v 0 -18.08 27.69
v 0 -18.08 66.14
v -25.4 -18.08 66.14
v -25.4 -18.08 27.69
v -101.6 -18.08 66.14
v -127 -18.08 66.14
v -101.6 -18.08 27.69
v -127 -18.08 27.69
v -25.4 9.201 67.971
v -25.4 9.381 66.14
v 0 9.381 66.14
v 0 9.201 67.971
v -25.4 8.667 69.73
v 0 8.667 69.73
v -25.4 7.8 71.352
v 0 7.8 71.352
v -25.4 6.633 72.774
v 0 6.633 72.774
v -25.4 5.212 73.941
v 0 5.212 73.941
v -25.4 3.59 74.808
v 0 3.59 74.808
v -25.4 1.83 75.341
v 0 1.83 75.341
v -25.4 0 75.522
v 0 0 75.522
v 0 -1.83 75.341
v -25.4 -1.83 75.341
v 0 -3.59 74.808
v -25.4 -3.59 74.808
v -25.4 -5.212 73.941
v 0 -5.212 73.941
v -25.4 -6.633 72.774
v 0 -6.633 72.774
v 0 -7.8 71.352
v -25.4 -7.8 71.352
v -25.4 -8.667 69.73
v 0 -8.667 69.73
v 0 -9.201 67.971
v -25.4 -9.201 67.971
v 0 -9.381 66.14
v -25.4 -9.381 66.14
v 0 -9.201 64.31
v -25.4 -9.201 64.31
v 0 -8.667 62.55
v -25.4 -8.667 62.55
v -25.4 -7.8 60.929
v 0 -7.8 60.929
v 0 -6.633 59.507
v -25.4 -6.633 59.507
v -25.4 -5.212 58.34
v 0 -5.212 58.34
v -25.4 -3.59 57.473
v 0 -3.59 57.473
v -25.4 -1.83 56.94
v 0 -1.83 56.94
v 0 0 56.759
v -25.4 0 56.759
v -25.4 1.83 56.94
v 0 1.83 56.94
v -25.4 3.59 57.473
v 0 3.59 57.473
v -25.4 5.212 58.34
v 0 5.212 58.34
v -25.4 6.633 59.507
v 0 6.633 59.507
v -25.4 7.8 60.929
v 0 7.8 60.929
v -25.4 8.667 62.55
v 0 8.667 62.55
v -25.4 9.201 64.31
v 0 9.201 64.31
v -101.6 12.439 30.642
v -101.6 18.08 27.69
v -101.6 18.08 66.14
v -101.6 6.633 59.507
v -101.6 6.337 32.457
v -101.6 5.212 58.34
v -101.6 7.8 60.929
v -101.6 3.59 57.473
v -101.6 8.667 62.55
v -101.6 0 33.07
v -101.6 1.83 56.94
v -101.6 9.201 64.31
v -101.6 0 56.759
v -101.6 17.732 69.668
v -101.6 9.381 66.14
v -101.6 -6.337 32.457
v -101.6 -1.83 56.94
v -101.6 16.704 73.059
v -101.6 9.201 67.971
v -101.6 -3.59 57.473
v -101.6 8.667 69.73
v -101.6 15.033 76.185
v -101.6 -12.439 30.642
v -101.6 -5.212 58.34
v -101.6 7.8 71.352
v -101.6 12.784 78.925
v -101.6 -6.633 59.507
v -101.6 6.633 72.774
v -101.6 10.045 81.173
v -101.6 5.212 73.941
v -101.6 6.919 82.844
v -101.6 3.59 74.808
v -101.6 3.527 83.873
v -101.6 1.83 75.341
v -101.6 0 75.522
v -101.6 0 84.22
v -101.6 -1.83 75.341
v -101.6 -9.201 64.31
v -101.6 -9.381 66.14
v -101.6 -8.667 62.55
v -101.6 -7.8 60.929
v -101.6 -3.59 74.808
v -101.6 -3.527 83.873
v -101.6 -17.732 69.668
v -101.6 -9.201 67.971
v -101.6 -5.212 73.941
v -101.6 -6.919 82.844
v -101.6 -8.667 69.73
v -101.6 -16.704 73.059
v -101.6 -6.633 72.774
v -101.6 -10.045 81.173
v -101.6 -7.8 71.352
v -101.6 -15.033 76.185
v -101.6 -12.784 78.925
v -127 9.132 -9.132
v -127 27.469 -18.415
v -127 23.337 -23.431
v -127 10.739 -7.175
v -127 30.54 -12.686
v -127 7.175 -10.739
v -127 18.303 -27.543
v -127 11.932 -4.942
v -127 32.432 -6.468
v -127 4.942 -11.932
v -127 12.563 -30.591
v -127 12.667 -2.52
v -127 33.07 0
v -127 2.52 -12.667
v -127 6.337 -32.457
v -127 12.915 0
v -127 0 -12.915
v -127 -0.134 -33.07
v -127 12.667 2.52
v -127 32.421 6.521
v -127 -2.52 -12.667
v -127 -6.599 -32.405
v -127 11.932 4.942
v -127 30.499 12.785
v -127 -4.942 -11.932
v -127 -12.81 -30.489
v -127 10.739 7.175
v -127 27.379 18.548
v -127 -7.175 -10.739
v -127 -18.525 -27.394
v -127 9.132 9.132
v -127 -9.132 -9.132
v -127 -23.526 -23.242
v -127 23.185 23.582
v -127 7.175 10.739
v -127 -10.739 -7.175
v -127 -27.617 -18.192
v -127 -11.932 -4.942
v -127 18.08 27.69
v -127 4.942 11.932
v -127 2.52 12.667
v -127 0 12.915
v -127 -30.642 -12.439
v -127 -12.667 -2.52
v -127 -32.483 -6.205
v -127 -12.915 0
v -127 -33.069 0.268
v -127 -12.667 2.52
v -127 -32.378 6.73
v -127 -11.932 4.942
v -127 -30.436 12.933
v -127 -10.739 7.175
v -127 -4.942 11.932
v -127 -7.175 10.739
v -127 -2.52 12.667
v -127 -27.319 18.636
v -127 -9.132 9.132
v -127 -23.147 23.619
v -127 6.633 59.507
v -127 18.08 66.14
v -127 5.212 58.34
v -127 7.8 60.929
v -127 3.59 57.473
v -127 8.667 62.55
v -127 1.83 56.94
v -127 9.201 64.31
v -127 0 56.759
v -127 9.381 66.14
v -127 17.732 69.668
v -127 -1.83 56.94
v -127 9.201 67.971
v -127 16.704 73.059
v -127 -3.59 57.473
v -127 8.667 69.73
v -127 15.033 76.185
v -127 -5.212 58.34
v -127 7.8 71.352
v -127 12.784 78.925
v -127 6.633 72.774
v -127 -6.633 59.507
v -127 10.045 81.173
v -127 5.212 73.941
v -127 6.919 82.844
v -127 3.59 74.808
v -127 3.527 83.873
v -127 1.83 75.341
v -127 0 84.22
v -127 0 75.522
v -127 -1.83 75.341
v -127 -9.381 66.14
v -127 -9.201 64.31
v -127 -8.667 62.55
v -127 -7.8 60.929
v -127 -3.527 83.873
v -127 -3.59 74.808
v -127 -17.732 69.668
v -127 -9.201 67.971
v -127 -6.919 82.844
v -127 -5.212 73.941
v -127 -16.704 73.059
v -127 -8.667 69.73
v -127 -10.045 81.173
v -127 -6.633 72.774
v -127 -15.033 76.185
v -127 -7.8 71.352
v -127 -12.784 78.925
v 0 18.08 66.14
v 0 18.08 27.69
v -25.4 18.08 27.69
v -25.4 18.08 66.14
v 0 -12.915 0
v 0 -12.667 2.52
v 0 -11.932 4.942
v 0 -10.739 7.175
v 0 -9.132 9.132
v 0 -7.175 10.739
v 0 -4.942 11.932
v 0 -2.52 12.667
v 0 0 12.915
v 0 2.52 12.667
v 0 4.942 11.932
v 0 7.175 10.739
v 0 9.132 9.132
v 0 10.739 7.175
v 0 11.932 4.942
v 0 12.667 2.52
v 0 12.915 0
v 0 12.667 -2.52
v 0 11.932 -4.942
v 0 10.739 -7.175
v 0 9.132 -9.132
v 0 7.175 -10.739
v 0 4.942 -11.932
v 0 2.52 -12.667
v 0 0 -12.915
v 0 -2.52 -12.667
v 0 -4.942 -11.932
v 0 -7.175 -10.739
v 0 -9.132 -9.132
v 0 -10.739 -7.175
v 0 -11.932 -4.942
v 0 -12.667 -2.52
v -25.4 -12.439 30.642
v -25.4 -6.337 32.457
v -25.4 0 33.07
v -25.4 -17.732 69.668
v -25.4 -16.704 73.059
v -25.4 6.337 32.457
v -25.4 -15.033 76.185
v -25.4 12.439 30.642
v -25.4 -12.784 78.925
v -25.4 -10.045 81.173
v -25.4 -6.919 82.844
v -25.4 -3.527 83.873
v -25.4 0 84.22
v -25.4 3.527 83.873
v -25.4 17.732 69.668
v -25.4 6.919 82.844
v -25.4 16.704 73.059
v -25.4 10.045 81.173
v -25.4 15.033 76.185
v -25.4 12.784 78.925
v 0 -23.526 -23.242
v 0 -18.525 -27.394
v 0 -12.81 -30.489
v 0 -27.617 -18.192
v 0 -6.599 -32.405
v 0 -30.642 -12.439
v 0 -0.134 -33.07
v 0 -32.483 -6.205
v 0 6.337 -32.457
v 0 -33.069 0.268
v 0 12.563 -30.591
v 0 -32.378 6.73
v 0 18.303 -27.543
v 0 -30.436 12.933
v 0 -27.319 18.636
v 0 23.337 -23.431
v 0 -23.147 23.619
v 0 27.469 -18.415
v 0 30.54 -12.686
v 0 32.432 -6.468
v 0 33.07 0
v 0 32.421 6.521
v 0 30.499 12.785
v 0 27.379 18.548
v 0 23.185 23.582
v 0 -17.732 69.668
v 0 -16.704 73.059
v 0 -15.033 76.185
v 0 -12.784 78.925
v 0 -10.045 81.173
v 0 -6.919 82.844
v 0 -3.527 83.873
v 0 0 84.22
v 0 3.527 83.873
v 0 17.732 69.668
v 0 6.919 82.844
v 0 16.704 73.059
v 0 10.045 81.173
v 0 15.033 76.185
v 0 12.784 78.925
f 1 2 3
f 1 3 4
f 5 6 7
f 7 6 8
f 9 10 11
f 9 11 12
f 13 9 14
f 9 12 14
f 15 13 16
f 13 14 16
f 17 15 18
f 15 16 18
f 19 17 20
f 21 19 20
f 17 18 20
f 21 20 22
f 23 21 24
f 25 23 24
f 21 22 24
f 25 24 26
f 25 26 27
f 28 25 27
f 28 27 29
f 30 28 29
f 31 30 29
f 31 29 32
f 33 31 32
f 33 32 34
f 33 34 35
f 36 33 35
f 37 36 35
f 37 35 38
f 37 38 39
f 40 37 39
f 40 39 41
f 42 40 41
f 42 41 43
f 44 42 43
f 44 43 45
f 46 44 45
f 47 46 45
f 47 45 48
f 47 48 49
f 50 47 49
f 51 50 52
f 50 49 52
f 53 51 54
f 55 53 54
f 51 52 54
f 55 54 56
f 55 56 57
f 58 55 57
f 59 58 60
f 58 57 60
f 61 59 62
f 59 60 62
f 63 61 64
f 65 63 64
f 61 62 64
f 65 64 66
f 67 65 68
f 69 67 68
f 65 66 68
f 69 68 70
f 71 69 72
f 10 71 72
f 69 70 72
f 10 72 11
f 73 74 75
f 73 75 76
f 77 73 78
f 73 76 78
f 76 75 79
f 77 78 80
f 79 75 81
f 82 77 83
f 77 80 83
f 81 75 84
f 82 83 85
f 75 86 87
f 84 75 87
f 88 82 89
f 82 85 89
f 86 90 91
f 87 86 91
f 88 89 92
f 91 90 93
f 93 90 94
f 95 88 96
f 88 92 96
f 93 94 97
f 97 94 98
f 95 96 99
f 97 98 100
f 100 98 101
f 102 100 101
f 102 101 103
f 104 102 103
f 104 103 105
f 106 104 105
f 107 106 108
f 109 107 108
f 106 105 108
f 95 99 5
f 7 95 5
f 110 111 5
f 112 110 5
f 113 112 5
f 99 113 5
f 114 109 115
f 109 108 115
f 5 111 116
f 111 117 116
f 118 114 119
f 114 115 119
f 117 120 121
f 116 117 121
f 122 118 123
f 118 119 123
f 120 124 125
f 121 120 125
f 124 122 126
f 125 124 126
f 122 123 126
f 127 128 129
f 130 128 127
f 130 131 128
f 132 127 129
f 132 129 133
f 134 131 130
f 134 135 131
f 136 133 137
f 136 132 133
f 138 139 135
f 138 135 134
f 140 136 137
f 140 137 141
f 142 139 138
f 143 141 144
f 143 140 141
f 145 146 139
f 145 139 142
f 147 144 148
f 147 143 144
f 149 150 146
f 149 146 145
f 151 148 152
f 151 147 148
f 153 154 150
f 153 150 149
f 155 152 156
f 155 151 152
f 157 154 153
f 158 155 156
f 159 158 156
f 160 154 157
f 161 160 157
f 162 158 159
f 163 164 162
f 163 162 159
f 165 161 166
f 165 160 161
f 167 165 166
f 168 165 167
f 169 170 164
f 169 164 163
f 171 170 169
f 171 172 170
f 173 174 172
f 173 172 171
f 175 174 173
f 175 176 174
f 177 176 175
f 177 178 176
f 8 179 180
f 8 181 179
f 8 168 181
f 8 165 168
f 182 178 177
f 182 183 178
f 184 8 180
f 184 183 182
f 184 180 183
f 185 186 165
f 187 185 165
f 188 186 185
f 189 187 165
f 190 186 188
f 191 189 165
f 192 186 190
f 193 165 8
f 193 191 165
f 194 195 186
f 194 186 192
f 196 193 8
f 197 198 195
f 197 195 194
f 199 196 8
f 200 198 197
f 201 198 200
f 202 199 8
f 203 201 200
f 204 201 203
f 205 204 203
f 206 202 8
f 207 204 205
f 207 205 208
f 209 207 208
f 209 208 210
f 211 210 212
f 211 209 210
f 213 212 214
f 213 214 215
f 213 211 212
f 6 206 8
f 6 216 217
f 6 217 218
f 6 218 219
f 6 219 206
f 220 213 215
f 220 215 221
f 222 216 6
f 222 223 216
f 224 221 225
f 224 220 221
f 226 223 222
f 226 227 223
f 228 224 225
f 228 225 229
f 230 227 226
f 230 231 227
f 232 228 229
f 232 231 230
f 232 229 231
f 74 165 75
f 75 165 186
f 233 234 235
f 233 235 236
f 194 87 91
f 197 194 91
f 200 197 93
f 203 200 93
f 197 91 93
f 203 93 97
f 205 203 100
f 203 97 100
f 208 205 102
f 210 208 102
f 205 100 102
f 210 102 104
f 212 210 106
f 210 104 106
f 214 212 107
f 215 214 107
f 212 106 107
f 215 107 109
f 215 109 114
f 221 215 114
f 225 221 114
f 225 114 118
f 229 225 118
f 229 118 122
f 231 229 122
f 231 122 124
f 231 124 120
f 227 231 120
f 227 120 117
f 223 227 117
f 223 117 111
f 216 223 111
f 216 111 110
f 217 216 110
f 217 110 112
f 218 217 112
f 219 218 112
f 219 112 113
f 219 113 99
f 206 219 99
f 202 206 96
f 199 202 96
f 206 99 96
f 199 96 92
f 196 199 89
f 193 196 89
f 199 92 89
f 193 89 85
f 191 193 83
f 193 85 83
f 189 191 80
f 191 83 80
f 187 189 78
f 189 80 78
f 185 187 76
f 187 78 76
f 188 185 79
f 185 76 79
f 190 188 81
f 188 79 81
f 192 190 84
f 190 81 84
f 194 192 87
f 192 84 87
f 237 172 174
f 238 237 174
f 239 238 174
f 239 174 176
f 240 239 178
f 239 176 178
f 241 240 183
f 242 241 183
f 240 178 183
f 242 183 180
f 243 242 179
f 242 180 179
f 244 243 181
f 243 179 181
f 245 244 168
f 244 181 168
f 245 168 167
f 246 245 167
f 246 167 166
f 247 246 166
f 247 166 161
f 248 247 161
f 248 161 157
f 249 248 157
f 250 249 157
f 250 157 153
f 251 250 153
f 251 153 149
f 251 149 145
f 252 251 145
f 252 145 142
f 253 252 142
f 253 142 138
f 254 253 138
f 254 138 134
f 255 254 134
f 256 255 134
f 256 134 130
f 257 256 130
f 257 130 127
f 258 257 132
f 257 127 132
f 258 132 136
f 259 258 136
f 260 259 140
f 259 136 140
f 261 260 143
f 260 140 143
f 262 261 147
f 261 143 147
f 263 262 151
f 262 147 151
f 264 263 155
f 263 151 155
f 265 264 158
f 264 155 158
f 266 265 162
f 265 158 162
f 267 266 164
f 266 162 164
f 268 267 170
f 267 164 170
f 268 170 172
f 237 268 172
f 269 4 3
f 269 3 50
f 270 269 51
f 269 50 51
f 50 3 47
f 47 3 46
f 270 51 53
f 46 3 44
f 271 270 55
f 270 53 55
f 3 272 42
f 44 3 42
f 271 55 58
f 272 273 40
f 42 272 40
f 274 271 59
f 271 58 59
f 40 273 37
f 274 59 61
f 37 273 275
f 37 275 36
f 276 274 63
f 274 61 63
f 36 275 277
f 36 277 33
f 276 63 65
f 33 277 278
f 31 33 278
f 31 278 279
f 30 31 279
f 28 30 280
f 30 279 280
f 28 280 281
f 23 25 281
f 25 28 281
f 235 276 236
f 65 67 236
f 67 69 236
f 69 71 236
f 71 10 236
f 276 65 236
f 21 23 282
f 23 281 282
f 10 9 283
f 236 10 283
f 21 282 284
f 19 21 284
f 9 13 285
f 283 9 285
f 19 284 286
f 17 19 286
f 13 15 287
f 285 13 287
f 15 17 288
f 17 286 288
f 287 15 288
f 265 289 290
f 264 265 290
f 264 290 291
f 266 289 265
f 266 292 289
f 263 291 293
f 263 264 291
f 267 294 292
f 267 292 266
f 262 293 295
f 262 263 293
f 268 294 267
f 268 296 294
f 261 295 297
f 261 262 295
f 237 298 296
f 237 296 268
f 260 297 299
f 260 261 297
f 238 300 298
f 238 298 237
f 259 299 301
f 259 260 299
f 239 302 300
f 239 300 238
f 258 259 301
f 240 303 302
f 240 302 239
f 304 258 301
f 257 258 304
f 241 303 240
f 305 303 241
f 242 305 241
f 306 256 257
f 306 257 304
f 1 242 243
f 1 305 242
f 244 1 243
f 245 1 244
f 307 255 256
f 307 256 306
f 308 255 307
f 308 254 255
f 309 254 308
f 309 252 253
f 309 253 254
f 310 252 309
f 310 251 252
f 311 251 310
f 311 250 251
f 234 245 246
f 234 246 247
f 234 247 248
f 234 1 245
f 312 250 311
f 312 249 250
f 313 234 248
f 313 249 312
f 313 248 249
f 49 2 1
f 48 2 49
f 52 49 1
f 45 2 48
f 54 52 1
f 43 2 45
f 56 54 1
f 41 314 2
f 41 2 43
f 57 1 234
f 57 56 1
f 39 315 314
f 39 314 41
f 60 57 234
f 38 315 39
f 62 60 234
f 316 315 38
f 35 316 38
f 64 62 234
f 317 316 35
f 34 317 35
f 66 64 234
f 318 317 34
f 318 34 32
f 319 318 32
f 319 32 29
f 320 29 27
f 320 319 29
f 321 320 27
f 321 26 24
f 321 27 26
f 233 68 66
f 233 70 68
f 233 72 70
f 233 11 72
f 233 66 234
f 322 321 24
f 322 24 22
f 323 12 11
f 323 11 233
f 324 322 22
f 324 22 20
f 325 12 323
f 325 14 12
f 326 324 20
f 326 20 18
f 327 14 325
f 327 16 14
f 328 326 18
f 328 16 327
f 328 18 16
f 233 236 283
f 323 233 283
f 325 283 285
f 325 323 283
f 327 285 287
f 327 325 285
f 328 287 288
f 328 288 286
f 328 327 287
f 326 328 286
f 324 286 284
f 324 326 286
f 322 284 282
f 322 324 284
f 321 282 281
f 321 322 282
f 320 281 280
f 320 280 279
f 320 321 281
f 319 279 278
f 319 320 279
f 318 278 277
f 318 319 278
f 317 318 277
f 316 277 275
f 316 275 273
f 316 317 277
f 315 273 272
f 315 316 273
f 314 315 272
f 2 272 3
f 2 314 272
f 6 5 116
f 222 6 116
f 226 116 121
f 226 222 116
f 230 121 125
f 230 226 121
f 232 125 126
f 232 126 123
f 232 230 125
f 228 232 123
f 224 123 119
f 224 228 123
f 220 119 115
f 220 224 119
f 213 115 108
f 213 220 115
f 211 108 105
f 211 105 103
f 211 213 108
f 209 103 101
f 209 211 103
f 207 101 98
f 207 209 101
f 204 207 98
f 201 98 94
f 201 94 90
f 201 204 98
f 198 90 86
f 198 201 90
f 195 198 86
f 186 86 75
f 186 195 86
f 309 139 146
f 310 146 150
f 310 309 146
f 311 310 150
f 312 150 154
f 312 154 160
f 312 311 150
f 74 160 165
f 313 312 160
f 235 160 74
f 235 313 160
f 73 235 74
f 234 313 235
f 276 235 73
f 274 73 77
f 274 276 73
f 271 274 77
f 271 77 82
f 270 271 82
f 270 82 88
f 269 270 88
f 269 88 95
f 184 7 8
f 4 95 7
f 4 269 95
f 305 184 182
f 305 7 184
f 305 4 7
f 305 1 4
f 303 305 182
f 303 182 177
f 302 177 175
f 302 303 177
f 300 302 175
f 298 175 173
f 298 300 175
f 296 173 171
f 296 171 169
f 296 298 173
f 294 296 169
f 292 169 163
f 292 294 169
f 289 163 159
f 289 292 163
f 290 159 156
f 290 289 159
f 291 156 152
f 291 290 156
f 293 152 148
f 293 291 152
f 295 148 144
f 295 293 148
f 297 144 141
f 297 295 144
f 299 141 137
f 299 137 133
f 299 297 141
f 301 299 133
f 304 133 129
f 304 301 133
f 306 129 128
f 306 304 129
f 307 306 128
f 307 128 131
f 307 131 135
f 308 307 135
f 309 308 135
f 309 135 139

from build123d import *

# Parameters (mm, degrees)
F0_R      = 33.0702193876
F1_DEPTH  = 63.5
F3_DEPTH  = 25.4
F7_DEPTH  = 25.4
F8_DEPTH  = 25.4
F9_R      = 12.915127355
F10_DEPTH = 127.001
F11_R     = 9.381167956
F12_DEPTH = 127.001


with BuildPart() as f1:
    # F0 (on Right) → F1 (new body)
    with BuildSketch(Plane.YZ):
        Circle(F0_R)
    extrude(amount=-F1_DEPTH)

    # F2 (on face) → F3 (join)
    with BuildSketch(Plane.YZ):
        with BuildLine():
            Line((-18.0798303336, 66.1404387753), (-18.0798303336, 27.69041613))
            ThreePointArc((-18.0798303336, 27.69041613), (0, 33.0702193876), (18.0798303336, 27.69041613))
            Line((18.0798303336, 27.69041613), (18.0798303336, 66.1404387753))
            Line((18.0798303336, 66.1404387753), (-18.0798303336, 66.1404387753))
        make_face()
        with BuildLine():
            Line((-18.0798303336, 27.69041613), (-18.0798303336, 0))
            Line((-18.0798303336, 0), (18.0798303336, 0))
            Line((18.0798303336, 0), (18.0798303336, 27.69041613))
            ThreePointArc((18.0798303336, 27.69041613), (0, 33.0702193876), (-18.0798303336, 27.69041613))
        make_face()
    extrude(amount=-F3_DEPTH)

    # F4: F1 across face


with BuildPart() as f1_1:
    add(f1.part)
    add(f1.part.mirror(Plane(origin=(-63.5, 0, 0), x_dir=(0, 1, 0), z_dir=(-1, 0, 0))))

    # F5 (on face) → F7 (join)
    with BuildSketch(Plane.YZ):
        with BuildLine():
            ThreePointArc((-18.0798303336, 66.1404387753), (0, 48.0606084417), (18.0798303336, 66.1404387753))
            Line((18.0798303336, 66.1404387753), (-18.0798303336, 66.1404387753))
        make_face()
        with BuildLine():
            Line((-18.0798303336, 66.1404387753), (18.0798303336, 66.1404387753))
            ThreePointArc((18.0798303336, 66.1404387753), (0, 84.2202691088), (-18.0798303336, 66.1404387753))
        make_face()
    extrude(amount=-F7_DEPTH)

    # F6 (on face) → F8 (join)
    with BuildSketch(Plane(origin=(-127, 0, 0), x_dir=(0, -1, 0), z_dir=(-1, 0, 0))):
        with BuildLine():
            Line((-18.0798303336, 66.1404387753), (18.0798303336, 66.1404387753))
            ThreePointArc((18.0798303336, 66.1404387753), (0, 84.2202691088), (-18.0798303336, 66.1404387753))
        make_face()
    extrude(amount=-F8_DEPTH)

    # F9 (on face) → F10 (cut, through all)
    with BuildSketch(Plane(origin=(-127, 0, 0), x_dir=(0, -1, 0), z_dir=(-1, 0, 0))):
        Circle(F9_R)
    extrude(amount=-F10_DEPTH, mode=Mode.SUBTRACT)

    # F11 (on face) → F12 (cut, through all)
    with BuildSketch(Plane.YZ):
        with Locations((0, 66.1404387753)):
            Circle(F11_R)
    extrude(amount=-F12_DEPTH, mode=Mode.SUBTRACT)


solid = f1_1.part
